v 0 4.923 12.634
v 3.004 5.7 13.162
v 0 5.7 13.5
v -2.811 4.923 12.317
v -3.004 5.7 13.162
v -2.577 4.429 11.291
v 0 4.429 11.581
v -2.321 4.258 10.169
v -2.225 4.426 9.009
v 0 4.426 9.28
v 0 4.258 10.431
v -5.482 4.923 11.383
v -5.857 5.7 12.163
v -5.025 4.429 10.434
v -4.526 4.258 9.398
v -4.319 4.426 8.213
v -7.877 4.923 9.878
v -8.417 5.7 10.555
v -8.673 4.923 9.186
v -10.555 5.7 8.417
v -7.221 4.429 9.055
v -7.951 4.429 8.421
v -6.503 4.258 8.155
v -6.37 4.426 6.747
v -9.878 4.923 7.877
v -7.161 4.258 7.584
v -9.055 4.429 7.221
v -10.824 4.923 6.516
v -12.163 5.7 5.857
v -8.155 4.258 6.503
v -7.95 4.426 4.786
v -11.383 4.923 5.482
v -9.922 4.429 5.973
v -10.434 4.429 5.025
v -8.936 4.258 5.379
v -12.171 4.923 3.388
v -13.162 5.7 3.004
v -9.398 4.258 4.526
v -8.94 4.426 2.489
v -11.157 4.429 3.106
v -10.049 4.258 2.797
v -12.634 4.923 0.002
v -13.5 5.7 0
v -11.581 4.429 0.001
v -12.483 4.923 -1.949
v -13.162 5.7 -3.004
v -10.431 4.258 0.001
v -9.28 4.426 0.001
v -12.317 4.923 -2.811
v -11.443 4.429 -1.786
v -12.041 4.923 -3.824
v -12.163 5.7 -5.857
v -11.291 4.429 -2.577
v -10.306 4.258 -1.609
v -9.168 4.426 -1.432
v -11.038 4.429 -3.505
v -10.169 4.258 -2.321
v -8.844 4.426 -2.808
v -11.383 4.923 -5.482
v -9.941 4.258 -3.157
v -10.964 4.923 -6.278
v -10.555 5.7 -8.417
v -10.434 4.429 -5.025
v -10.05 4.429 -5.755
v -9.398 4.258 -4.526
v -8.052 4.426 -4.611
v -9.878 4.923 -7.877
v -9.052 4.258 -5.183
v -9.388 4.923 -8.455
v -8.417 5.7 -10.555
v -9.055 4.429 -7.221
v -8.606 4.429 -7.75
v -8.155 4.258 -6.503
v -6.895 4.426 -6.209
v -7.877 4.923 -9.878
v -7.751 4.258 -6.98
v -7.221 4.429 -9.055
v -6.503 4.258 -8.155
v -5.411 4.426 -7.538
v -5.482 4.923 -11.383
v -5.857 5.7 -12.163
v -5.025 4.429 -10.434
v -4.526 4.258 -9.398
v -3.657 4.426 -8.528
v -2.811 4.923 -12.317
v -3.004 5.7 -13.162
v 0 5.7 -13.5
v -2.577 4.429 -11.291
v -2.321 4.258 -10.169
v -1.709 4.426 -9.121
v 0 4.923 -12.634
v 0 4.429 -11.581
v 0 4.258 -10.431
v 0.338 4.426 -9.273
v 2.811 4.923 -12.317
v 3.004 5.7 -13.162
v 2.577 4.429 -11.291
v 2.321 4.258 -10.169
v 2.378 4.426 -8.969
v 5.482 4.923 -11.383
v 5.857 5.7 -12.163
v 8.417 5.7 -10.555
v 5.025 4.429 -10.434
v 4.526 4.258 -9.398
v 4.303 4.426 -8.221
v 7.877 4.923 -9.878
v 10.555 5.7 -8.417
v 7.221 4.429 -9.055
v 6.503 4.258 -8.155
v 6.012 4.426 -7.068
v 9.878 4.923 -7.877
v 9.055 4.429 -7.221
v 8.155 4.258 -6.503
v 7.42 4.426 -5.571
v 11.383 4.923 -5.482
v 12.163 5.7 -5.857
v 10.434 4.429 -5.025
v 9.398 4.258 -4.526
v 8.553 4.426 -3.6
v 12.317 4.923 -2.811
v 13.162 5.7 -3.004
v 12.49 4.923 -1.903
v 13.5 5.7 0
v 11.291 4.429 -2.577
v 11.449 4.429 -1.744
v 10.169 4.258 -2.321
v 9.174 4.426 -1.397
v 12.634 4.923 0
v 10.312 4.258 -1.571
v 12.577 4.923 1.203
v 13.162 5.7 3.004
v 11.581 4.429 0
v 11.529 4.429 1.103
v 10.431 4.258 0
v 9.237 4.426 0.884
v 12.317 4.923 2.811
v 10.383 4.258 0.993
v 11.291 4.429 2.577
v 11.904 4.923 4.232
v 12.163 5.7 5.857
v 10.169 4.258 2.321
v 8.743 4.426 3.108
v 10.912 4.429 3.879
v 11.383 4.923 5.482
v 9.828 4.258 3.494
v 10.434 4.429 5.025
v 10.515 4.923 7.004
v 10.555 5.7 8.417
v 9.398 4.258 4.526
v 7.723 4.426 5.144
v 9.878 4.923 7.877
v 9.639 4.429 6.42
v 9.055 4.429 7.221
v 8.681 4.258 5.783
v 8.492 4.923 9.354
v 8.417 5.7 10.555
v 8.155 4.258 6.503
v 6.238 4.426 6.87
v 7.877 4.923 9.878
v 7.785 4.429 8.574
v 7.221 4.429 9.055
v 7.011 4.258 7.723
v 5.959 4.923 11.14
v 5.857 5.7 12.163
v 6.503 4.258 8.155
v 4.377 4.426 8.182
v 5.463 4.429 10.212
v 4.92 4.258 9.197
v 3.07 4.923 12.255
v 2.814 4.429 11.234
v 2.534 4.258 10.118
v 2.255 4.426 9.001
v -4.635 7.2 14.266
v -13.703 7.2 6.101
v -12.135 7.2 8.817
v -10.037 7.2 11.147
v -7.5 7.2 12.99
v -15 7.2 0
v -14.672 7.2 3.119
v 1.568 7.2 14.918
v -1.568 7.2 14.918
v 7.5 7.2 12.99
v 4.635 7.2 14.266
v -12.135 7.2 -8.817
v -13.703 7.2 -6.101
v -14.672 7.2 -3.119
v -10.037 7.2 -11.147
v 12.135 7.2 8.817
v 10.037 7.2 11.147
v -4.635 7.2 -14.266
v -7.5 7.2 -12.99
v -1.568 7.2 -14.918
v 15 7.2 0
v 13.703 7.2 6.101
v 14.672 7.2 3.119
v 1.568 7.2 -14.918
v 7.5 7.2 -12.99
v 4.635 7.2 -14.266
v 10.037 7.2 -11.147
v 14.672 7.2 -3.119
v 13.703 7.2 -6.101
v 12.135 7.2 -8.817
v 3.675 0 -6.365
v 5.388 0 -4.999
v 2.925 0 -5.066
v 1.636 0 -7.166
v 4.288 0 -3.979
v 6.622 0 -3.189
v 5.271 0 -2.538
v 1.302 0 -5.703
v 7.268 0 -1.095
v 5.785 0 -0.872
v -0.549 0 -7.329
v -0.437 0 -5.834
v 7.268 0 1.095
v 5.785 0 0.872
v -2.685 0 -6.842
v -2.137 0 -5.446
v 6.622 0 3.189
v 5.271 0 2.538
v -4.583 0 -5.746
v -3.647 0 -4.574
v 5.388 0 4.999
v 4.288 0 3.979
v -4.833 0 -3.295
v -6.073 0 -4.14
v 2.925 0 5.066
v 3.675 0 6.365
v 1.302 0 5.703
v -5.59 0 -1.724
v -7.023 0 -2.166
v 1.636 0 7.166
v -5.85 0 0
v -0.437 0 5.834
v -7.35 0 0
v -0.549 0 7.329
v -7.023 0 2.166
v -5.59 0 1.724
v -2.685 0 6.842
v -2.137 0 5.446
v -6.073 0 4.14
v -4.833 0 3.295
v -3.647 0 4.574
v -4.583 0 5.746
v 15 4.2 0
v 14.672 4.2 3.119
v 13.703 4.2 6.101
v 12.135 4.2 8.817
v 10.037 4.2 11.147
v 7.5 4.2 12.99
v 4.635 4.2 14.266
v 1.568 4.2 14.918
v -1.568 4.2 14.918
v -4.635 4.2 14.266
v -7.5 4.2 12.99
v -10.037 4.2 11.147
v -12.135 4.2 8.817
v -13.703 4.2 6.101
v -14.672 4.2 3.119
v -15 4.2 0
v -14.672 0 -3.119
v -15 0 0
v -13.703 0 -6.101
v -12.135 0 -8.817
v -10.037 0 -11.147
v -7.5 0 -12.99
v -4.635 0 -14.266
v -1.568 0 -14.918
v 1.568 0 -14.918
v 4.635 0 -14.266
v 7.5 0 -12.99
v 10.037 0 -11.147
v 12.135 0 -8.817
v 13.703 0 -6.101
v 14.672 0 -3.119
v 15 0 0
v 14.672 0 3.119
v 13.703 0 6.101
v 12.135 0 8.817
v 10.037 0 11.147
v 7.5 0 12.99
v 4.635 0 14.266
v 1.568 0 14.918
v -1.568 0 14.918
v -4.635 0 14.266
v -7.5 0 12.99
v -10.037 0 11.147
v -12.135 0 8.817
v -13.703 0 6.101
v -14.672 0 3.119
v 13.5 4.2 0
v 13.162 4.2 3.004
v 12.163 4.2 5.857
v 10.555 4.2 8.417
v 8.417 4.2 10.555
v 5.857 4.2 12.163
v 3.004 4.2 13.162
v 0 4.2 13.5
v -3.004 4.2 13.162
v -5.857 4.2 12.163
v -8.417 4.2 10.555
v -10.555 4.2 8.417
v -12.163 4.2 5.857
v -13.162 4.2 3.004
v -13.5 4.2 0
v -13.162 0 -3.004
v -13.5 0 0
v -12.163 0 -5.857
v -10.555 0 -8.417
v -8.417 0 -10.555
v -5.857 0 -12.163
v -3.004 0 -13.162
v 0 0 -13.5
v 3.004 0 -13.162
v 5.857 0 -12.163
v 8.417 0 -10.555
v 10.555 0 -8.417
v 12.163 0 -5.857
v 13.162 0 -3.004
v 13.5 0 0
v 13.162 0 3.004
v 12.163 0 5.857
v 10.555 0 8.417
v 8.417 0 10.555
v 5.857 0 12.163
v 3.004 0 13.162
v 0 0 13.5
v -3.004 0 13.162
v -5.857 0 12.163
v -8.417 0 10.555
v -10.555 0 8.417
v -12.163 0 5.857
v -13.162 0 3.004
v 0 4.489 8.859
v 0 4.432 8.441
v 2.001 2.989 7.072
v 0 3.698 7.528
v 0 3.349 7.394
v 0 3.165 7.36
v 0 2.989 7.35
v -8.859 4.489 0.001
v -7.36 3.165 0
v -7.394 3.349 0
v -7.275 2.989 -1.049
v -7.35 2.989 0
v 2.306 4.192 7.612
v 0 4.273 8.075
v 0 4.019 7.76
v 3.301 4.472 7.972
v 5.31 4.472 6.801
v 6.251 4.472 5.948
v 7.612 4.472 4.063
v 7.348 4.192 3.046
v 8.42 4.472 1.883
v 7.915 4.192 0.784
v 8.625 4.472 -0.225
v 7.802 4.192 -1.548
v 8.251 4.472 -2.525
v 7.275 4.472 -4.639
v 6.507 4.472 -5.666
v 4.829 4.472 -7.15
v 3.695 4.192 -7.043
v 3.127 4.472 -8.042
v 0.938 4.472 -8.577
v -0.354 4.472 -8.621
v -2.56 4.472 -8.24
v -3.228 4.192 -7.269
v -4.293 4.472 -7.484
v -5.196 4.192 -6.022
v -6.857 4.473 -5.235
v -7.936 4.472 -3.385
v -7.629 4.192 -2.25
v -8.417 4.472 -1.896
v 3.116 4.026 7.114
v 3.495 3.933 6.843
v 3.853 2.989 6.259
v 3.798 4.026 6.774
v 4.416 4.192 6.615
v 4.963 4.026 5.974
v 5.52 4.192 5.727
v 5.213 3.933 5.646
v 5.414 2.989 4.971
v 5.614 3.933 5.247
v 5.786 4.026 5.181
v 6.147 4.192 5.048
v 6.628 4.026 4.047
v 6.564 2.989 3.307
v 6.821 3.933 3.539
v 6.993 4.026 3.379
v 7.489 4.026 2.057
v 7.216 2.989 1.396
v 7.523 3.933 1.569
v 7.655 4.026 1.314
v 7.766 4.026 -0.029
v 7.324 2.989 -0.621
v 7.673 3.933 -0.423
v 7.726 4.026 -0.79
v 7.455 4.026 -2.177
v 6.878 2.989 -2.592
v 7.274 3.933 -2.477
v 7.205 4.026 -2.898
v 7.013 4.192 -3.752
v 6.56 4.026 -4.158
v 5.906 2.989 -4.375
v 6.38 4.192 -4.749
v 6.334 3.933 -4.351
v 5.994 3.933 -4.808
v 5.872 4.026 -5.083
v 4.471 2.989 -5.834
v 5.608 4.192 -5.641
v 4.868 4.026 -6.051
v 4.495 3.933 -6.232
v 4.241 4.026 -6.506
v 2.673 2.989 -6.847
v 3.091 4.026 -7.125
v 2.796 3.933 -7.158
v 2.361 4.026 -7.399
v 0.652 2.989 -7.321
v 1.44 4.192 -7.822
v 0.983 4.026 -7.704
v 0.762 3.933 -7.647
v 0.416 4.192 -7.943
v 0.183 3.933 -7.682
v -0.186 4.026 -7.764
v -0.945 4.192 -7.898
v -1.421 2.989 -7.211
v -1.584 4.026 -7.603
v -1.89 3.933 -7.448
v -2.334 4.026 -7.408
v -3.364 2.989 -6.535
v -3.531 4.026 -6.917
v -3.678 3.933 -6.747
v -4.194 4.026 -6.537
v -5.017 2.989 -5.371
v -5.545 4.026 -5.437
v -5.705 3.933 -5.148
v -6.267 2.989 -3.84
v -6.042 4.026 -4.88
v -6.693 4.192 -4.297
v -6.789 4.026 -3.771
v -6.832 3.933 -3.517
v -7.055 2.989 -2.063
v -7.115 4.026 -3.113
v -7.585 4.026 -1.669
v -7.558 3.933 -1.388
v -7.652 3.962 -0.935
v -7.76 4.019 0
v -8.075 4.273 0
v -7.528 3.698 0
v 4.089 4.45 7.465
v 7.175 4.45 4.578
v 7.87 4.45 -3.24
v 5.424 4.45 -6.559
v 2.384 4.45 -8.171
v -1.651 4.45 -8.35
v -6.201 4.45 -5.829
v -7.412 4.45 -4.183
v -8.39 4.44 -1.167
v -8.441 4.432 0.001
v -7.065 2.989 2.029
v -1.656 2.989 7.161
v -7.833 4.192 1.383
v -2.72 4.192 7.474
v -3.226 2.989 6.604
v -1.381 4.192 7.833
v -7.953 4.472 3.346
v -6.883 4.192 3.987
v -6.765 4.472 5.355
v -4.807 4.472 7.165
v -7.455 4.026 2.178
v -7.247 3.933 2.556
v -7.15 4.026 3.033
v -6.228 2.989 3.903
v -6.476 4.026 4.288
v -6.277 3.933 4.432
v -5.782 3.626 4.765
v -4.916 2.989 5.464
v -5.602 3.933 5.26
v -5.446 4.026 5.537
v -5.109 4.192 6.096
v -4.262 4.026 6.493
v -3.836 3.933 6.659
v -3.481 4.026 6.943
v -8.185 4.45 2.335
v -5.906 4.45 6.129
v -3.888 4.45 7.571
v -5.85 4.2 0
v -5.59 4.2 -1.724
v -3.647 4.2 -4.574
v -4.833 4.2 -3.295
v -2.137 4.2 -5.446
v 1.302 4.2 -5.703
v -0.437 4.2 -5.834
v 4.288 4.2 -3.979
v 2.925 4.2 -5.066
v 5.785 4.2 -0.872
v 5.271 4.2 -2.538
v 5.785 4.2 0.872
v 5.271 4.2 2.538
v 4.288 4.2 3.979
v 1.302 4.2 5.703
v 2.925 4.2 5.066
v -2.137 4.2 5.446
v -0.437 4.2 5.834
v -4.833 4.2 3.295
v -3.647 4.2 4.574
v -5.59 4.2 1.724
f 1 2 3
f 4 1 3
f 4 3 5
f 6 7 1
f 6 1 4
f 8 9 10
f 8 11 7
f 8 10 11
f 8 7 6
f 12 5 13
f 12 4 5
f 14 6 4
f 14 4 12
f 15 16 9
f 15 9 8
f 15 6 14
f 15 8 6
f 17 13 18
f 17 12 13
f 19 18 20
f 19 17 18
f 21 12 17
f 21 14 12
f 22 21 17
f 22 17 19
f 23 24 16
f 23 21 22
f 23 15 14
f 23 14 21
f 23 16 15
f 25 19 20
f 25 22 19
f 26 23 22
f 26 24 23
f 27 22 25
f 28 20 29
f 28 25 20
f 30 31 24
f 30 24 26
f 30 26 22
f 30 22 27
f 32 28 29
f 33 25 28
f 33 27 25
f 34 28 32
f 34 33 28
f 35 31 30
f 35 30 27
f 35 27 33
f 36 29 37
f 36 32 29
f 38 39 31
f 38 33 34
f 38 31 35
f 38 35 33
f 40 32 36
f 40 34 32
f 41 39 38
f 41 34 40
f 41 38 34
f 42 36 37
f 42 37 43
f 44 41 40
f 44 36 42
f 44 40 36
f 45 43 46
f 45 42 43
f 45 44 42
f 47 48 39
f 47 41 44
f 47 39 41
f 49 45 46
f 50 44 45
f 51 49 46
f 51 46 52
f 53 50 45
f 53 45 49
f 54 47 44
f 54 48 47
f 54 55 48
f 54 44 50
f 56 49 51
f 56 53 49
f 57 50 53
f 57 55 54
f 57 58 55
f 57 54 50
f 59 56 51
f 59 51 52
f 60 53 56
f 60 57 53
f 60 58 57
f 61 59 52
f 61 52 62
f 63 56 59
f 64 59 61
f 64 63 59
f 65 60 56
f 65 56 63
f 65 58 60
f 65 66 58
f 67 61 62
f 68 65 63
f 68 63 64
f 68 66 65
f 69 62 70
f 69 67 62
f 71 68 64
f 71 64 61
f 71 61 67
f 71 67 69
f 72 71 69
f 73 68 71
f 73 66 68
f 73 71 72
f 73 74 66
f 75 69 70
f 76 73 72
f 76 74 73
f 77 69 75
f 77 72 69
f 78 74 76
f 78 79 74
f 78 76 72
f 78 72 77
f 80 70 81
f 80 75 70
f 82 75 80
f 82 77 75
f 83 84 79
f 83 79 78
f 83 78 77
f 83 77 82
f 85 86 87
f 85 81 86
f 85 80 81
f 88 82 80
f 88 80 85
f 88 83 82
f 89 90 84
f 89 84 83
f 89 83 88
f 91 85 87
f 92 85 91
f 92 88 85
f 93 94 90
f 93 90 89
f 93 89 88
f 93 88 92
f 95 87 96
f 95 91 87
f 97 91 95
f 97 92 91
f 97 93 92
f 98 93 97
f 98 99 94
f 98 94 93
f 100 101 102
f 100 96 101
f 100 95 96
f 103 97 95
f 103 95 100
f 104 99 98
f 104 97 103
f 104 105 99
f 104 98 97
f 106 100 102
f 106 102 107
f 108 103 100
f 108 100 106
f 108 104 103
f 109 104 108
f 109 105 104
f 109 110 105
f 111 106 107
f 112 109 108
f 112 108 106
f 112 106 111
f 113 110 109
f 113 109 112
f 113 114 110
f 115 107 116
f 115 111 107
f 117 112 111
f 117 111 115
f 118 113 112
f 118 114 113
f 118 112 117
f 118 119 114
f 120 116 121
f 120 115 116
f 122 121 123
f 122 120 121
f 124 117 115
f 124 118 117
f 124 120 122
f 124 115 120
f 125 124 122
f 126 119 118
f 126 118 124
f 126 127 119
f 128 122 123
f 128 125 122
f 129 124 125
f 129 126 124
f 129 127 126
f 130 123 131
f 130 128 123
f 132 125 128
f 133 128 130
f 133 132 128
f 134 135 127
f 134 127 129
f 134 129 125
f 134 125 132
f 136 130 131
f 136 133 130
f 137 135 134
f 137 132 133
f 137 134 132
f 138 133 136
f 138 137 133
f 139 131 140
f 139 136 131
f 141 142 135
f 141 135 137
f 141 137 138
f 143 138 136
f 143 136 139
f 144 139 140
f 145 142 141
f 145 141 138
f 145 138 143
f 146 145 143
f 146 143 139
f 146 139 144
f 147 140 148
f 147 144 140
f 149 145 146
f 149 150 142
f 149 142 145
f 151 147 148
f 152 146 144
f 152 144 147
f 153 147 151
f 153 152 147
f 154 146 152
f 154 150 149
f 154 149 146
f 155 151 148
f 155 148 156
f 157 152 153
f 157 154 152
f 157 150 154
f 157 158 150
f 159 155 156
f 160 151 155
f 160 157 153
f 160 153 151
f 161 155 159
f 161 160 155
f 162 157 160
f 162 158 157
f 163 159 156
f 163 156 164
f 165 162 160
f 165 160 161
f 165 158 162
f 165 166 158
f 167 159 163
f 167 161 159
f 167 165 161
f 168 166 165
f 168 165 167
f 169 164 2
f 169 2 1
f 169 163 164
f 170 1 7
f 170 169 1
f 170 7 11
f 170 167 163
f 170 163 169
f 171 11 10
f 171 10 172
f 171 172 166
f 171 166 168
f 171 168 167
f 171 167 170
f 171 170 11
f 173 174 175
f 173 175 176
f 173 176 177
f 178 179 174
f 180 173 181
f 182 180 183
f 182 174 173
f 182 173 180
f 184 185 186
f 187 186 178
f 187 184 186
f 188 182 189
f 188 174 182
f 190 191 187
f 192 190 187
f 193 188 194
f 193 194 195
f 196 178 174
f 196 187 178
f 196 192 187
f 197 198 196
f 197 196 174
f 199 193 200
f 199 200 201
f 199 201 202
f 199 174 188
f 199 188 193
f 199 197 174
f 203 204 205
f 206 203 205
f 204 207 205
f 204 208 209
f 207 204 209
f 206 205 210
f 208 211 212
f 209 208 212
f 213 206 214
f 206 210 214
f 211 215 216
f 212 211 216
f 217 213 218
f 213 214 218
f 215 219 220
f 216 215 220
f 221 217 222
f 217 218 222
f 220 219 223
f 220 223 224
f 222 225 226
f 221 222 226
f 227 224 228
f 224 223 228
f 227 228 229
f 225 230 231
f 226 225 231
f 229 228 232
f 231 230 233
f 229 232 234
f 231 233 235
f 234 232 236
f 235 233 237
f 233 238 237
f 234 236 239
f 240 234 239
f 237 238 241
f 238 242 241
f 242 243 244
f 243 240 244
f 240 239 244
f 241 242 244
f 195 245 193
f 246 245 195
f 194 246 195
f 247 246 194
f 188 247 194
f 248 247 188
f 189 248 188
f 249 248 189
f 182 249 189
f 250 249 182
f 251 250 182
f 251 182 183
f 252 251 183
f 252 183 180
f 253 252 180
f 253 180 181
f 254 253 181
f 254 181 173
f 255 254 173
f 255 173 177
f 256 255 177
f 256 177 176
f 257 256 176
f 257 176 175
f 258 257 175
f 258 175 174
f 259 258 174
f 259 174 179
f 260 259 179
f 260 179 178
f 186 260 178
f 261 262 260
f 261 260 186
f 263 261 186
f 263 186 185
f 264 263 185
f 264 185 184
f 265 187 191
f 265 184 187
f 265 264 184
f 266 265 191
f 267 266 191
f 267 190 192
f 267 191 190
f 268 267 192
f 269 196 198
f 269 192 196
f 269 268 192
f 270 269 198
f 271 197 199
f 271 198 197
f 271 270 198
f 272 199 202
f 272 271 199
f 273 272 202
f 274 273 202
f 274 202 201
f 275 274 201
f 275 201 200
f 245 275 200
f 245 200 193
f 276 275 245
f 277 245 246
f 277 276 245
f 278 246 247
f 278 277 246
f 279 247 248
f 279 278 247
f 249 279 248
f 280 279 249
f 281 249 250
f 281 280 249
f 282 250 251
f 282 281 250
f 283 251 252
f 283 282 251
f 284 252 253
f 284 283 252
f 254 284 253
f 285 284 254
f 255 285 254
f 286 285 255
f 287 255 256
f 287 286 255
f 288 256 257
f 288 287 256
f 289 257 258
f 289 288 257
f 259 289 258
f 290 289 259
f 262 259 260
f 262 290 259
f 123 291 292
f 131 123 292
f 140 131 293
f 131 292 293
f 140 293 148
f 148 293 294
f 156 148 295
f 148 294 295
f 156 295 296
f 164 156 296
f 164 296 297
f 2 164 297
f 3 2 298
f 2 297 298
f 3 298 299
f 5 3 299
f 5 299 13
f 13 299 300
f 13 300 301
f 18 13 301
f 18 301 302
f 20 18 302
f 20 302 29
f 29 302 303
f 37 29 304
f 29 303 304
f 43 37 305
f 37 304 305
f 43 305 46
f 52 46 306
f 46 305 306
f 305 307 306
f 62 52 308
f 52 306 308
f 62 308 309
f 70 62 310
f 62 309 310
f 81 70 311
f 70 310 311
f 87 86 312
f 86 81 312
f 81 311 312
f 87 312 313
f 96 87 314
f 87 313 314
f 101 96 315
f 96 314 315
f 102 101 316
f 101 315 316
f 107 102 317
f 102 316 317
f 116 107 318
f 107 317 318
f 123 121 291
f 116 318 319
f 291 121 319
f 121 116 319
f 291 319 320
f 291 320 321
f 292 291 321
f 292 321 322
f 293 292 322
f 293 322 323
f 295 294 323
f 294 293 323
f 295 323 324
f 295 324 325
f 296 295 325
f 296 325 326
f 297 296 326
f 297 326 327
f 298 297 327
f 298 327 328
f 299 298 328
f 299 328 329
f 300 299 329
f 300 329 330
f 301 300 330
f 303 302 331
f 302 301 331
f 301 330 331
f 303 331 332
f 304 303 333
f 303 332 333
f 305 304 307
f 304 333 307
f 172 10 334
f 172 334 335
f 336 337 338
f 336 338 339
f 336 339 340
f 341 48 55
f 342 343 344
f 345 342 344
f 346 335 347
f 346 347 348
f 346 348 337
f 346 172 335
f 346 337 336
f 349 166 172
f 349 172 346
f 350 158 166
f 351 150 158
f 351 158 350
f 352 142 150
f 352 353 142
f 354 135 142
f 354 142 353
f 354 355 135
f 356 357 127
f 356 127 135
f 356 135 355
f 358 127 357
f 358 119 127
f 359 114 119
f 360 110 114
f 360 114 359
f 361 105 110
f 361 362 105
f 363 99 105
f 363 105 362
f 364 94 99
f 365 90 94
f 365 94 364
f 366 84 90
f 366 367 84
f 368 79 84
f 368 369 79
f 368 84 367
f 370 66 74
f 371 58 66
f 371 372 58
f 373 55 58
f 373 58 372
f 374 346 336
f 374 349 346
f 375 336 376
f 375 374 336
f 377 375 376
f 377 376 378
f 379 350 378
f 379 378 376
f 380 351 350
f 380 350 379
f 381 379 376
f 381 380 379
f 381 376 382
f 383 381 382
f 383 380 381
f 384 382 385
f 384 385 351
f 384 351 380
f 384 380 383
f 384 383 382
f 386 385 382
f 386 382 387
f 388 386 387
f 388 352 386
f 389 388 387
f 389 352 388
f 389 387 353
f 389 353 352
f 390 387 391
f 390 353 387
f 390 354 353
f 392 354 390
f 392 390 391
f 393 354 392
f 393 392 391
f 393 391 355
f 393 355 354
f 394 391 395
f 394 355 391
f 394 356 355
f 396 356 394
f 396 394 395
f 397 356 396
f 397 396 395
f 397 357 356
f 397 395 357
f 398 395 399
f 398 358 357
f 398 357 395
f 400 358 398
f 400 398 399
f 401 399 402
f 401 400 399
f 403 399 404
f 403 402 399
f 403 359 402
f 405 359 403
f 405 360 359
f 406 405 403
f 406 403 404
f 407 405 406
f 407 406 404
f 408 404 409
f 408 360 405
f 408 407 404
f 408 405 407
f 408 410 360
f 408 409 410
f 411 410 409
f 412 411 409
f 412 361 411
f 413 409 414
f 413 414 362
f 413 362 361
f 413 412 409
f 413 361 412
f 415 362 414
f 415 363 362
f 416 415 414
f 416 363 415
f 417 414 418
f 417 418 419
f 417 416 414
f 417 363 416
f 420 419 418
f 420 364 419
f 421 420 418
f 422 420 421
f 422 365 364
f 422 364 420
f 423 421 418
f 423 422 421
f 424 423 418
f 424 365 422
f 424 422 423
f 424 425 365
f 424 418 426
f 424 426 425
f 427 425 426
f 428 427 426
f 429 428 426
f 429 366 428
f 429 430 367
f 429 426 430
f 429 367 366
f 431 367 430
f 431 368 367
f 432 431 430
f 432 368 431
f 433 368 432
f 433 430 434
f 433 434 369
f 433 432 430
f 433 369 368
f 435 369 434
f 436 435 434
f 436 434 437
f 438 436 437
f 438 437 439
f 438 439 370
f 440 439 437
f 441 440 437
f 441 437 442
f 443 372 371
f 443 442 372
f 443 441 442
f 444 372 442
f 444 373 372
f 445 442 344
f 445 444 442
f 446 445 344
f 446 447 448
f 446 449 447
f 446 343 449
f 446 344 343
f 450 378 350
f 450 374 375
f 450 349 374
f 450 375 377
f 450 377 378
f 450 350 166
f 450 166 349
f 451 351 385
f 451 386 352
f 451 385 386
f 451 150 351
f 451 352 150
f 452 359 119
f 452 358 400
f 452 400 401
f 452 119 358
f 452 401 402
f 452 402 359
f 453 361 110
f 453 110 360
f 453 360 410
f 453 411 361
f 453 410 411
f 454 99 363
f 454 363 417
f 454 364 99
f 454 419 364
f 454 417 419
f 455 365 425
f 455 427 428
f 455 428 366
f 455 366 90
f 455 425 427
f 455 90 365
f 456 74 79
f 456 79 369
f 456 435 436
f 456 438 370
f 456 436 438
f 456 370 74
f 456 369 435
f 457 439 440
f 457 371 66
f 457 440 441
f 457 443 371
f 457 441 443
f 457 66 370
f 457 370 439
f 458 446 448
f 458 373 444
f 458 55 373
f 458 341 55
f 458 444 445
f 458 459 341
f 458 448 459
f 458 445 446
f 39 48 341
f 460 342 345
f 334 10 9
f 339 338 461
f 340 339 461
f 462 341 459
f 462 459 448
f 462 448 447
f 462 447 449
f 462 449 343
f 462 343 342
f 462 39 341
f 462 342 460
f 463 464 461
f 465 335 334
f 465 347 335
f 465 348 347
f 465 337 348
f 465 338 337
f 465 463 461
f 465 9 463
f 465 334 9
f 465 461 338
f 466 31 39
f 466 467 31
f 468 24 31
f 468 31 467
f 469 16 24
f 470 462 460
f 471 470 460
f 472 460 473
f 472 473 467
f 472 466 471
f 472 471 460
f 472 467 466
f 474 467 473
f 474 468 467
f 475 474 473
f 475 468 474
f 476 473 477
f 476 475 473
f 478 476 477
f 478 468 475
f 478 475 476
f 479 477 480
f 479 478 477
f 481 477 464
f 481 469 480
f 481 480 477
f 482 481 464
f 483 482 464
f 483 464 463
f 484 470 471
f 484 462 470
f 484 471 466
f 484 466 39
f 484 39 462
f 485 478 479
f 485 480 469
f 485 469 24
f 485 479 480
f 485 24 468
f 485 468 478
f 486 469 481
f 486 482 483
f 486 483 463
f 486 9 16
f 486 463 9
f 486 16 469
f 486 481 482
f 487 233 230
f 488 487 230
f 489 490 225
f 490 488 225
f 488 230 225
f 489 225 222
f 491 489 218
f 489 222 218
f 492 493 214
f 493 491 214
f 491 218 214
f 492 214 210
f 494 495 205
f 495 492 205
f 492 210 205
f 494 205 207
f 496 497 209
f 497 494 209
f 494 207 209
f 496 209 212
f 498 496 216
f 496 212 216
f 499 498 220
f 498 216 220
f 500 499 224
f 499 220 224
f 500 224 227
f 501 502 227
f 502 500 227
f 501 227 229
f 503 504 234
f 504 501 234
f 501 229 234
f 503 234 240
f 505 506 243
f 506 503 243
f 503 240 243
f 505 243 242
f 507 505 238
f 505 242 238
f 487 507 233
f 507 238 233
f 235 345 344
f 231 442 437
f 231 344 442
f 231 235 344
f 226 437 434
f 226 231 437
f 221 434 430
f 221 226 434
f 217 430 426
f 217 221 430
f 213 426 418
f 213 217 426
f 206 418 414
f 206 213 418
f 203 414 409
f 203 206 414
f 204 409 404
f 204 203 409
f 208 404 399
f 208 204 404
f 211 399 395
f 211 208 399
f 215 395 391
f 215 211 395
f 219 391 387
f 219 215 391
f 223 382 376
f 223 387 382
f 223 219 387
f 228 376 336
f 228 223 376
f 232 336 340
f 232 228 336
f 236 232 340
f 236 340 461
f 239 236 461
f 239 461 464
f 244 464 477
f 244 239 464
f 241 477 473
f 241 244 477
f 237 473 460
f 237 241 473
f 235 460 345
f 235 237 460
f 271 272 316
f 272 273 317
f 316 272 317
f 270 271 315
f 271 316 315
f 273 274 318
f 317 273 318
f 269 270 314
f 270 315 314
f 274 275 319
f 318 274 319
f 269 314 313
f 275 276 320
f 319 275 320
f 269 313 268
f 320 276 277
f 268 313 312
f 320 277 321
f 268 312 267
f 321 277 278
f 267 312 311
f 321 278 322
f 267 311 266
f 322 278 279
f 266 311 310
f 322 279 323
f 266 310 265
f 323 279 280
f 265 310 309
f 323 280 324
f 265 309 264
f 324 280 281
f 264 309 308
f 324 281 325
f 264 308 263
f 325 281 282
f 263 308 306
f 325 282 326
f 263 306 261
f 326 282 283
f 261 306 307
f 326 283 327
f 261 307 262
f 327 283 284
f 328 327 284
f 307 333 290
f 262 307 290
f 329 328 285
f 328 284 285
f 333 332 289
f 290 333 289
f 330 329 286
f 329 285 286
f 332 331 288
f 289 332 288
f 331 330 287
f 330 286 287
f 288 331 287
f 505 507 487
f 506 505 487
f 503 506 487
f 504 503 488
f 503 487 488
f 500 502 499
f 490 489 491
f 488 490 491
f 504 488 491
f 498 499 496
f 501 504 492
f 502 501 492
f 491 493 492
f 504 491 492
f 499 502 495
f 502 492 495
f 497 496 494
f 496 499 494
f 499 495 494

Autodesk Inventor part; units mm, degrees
ref_plane "YZ Plane" through (0, 0, 0) normal (1, 0, 0) x (0, 1, 0)
ref_plane "XZ Plane" through (0, 0, 0) normal (0, 1, 0) x (-1, 0, 0)
ref_plane "XY Plane" through (0, 0, 0) normal (0, 0, 1) x (1, 0, 0)
sketch "Sketch1" plane through (0, 0, 0) normal (0, 1, 0) x (-1, 0, 0)
  circle A0 centre (0, 0) radius 5.85
  circle A1 centre (0, 0) radius 15
  dimension "d0" = 11.7
  dimension "d1" = 30
extrude "Extrusion1" add sketch "Sketch1" along normal blind 4.2
sketch "Sketch2" plane through (0, 4.2, 0) normal (0, 1, 0) x (1, 0, 0)
  circle A0 centre (0, 0) radius 15 projected
extrude "Extrusion2" add sketch "Sketch2" along normal blind 3
shell "Shell1" thickness 1.5 removed faces 1 at (-11.748, 0, -1.6632)
sketch "Sketch3" plane through (0, 0, 0) normal (1, 0, 0) x (0, 1, 0)
  line L0 (5.7, -13.5) -> (5.7, 13.5) projected
  line L1 (5.7, 7.35) -> (0, 7.35) projected
  arc A0 (5.7, 13.5) -> (5.7, 7.35) centre (8.2582, 10.425) ccw
  line L2 (-1.6516, 0) -> (9.9098, 0) projected
  point P0 (0, 0)
  dimension "d7" = 4
revolve "Revolution1" add sketch "Sketch3" angle 360 about axis through (0, -10, 0) along (0, 1, 0)
fillet "Fillet1" radius 1.5 2 edges at (5.1969, 5.7, -5.1976) (-5.1969, 5.7, 5.1976)
properties part number "Button_adapter"
